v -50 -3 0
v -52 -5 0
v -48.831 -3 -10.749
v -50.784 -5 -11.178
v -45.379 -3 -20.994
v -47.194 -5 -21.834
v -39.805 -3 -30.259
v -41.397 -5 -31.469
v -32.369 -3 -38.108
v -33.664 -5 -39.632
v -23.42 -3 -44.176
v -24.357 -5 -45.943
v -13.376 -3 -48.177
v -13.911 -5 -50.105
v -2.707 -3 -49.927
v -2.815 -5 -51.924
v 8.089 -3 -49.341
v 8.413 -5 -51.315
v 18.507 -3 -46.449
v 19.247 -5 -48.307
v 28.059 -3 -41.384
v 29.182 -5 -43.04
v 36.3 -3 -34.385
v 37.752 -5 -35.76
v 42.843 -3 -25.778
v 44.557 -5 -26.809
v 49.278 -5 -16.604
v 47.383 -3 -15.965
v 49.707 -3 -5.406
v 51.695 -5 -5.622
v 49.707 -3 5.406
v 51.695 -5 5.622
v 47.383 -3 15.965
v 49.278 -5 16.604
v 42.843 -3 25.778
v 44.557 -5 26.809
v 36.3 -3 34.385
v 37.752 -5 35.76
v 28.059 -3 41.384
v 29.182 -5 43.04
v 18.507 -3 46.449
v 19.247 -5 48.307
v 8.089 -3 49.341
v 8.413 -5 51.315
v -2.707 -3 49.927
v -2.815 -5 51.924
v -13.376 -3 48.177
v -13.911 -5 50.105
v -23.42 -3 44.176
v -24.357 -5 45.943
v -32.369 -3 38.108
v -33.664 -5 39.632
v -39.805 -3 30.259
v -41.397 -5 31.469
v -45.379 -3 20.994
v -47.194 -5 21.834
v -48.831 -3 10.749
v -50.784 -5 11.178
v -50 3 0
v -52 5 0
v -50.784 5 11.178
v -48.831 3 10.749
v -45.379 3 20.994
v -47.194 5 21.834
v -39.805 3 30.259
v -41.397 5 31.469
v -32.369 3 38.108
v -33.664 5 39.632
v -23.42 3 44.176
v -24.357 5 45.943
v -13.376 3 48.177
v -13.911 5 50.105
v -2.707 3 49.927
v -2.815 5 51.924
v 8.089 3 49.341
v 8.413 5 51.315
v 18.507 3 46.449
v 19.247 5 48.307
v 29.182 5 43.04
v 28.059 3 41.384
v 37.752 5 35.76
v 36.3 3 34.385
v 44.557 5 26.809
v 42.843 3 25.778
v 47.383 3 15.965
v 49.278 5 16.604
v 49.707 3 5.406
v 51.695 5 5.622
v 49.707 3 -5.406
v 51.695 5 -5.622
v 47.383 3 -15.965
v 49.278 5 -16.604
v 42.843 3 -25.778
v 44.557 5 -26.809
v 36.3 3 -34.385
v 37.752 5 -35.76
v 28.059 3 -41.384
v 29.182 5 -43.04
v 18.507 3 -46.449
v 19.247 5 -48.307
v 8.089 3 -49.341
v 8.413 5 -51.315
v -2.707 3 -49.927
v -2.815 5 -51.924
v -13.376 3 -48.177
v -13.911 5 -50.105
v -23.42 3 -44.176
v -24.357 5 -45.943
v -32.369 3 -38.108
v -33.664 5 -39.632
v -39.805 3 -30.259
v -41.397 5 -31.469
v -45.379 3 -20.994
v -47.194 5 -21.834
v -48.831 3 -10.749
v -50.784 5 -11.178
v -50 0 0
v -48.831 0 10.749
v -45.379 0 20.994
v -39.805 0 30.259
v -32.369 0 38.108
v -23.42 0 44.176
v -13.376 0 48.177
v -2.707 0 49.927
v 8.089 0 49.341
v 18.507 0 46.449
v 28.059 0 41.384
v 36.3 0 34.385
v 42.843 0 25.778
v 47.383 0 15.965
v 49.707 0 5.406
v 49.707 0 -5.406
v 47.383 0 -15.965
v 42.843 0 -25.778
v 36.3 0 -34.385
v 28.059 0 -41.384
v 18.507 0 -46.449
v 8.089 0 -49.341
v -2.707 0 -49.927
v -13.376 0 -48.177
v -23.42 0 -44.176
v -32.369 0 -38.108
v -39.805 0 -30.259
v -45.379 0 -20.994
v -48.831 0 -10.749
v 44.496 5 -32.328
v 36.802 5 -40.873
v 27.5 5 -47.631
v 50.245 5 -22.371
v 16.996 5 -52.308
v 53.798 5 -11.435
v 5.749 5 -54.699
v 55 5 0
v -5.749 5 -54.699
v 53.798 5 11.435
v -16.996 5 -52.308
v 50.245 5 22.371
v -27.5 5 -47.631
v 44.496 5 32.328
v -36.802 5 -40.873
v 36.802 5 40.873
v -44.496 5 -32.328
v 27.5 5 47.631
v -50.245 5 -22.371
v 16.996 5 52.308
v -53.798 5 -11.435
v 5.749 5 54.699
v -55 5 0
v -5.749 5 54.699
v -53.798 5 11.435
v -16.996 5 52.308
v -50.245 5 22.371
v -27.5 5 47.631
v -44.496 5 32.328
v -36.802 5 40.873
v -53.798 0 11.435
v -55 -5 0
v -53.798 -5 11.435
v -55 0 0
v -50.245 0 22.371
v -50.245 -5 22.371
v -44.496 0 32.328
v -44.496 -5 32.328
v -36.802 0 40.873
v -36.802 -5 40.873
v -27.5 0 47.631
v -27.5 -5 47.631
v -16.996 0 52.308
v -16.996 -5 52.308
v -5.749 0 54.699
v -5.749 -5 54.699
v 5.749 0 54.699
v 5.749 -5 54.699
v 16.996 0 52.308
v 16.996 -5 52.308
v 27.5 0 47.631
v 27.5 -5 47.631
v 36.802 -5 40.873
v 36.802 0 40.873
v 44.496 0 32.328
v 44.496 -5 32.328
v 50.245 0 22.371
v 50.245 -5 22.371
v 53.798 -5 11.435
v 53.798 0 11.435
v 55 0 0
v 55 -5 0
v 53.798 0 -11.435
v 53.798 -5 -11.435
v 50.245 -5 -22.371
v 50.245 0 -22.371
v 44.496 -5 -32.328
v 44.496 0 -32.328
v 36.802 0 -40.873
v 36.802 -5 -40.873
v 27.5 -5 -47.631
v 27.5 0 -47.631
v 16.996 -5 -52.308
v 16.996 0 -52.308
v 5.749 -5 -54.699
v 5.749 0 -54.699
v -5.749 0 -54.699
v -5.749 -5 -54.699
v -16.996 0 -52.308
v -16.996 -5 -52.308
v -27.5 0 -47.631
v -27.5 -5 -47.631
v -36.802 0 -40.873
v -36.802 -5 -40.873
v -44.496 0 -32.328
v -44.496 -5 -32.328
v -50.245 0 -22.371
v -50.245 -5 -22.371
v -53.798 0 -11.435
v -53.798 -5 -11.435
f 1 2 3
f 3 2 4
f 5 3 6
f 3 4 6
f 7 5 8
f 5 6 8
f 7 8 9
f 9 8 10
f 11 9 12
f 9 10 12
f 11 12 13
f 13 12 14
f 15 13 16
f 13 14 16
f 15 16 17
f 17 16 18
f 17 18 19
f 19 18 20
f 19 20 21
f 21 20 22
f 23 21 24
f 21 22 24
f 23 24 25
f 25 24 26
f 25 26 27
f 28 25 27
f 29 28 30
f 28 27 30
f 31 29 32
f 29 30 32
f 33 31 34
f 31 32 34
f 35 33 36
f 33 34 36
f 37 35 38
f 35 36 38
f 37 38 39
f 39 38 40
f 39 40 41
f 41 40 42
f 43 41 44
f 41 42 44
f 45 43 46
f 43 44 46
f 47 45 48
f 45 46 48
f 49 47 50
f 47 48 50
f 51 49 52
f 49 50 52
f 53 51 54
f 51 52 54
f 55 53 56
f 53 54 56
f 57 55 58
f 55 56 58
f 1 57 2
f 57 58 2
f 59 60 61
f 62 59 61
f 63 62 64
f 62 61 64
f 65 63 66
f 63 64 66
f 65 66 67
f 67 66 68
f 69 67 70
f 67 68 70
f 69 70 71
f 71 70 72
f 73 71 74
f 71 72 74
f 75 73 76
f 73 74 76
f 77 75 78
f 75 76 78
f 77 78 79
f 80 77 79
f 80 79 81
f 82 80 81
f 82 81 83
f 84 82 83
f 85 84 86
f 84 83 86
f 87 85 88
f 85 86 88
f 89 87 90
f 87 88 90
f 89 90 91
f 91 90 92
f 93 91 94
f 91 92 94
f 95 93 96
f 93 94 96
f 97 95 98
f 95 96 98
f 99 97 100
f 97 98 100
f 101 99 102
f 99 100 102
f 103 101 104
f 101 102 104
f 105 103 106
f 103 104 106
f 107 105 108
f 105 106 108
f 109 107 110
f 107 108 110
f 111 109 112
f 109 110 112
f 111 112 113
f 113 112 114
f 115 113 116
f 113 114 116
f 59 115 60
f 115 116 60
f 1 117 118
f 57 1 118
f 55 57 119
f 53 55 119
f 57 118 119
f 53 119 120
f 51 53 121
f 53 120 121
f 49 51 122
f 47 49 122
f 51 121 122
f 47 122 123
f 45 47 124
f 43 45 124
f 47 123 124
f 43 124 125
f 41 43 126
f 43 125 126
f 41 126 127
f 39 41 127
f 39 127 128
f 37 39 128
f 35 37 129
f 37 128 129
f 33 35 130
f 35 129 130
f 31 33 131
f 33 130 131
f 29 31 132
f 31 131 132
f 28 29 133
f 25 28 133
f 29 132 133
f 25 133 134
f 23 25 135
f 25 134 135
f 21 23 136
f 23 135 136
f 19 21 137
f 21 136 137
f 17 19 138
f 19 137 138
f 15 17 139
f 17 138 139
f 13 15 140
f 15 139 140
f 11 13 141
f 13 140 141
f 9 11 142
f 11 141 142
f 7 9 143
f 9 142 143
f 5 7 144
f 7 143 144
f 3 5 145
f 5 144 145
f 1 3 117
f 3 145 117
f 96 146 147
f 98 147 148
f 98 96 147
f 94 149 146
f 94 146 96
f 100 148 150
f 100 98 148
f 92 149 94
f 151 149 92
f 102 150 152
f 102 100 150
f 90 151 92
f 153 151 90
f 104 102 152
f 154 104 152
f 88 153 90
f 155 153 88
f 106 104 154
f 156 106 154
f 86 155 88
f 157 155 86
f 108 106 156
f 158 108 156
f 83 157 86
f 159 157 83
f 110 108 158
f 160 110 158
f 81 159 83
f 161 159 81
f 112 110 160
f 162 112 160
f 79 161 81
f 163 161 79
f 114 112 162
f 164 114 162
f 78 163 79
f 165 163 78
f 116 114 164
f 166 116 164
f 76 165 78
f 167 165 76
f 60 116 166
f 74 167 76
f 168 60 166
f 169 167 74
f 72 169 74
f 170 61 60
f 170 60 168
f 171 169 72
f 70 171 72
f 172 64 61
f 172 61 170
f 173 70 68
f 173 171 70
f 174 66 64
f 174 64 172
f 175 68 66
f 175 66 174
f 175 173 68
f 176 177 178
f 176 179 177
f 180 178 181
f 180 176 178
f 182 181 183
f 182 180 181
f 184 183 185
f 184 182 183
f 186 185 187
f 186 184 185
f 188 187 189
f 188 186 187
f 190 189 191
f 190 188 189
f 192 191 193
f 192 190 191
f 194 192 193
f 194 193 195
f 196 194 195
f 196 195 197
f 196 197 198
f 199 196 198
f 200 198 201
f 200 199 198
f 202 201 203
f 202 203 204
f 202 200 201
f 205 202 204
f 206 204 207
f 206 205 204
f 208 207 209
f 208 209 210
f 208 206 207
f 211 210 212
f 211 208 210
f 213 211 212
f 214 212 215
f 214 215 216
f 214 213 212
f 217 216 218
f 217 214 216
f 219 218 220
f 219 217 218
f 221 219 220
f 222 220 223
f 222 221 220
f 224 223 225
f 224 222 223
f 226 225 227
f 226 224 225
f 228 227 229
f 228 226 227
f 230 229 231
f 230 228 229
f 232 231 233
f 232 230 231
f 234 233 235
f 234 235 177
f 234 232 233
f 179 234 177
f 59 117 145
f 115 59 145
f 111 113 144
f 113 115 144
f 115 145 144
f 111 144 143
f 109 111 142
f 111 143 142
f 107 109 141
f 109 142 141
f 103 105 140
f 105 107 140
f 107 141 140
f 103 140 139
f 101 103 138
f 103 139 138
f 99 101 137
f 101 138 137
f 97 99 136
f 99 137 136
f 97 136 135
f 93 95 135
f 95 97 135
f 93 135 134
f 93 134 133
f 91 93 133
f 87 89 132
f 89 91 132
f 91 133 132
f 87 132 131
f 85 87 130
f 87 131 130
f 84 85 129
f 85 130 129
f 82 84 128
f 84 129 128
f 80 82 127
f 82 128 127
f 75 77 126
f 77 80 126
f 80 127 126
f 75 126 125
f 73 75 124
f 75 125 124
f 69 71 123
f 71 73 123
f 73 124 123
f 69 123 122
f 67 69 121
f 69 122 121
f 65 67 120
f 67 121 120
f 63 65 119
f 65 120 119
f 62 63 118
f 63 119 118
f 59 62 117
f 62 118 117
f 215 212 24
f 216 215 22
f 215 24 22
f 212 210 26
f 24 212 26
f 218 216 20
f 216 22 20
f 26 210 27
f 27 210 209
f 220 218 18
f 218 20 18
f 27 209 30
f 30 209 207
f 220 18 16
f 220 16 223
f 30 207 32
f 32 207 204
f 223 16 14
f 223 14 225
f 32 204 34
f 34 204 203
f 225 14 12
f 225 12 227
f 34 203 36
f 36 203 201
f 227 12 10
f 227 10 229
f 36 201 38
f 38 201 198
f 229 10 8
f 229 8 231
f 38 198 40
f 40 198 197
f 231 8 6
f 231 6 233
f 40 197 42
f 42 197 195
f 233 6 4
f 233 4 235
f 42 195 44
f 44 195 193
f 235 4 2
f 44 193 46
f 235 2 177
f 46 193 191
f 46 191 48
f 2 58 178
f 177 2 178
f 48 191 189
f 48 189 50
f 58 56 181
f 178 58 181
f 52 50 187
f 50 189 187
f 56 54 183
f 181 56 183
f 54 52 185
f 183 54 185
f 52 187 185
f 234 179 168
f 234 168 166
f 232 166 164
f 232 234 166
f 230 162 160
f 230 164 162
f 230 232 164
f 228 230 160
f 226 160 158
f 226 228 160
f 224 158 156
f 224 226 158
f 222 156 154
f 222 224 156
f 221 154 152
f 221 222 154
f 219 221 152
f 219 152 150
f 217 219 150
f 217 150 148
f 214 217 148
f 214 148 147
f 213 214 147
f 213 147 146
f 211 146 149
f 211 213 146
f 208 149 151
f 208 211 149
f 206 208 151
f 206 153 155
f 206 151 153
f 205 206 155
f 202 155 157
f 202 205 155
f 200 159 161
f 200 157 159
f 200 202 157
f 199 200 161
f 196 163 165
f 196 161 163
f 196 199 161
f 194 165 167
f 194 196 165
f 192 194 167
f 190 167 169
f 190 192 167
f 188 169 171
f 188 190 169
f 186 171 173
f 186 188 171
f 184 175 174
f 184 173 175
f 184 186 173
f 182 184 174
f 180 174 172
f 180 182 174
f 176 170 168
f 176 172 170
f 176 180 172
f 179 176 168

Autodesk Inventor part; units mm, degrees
ref_plane "YZ Plane" through (0, 0, 0) normal (1, 0, 0) x (0, 1, 0)
ref_plane "XZ Plane" through (0, 0, 0) normal (0, 1, 0) x (-1, 0, 0)
ref_plane "XY Plane" through (0, 0, 0) normal (0, 0, 1) x (1, 0, 0)
sketch "Sketch1" plane through (0, 0, 0) normal (0, 1, 0) x (-1, 0, 0)
  circle A0 centre (0, 0) radius 50
  circle A1 centre (0, 0) radius 55
  dimension "d0" = 100
  dimension "d1" = 110
extrude "Extrusion1" add sketch "Sketch1" along normal mid plane 10
chamfer "Chamfer1" distance 2 angle 45 1 edges at (50, 5, 0)
chamfer "Chamfer2" distance 2 angle 45 1 edges at (50, -5, 0)
sketch "Sketch2" plane through (0, 0, 0) normal (0, 1, 0) x (-1, 0, 0)
  point P0 (0, 0)
properties part number "Ring"
